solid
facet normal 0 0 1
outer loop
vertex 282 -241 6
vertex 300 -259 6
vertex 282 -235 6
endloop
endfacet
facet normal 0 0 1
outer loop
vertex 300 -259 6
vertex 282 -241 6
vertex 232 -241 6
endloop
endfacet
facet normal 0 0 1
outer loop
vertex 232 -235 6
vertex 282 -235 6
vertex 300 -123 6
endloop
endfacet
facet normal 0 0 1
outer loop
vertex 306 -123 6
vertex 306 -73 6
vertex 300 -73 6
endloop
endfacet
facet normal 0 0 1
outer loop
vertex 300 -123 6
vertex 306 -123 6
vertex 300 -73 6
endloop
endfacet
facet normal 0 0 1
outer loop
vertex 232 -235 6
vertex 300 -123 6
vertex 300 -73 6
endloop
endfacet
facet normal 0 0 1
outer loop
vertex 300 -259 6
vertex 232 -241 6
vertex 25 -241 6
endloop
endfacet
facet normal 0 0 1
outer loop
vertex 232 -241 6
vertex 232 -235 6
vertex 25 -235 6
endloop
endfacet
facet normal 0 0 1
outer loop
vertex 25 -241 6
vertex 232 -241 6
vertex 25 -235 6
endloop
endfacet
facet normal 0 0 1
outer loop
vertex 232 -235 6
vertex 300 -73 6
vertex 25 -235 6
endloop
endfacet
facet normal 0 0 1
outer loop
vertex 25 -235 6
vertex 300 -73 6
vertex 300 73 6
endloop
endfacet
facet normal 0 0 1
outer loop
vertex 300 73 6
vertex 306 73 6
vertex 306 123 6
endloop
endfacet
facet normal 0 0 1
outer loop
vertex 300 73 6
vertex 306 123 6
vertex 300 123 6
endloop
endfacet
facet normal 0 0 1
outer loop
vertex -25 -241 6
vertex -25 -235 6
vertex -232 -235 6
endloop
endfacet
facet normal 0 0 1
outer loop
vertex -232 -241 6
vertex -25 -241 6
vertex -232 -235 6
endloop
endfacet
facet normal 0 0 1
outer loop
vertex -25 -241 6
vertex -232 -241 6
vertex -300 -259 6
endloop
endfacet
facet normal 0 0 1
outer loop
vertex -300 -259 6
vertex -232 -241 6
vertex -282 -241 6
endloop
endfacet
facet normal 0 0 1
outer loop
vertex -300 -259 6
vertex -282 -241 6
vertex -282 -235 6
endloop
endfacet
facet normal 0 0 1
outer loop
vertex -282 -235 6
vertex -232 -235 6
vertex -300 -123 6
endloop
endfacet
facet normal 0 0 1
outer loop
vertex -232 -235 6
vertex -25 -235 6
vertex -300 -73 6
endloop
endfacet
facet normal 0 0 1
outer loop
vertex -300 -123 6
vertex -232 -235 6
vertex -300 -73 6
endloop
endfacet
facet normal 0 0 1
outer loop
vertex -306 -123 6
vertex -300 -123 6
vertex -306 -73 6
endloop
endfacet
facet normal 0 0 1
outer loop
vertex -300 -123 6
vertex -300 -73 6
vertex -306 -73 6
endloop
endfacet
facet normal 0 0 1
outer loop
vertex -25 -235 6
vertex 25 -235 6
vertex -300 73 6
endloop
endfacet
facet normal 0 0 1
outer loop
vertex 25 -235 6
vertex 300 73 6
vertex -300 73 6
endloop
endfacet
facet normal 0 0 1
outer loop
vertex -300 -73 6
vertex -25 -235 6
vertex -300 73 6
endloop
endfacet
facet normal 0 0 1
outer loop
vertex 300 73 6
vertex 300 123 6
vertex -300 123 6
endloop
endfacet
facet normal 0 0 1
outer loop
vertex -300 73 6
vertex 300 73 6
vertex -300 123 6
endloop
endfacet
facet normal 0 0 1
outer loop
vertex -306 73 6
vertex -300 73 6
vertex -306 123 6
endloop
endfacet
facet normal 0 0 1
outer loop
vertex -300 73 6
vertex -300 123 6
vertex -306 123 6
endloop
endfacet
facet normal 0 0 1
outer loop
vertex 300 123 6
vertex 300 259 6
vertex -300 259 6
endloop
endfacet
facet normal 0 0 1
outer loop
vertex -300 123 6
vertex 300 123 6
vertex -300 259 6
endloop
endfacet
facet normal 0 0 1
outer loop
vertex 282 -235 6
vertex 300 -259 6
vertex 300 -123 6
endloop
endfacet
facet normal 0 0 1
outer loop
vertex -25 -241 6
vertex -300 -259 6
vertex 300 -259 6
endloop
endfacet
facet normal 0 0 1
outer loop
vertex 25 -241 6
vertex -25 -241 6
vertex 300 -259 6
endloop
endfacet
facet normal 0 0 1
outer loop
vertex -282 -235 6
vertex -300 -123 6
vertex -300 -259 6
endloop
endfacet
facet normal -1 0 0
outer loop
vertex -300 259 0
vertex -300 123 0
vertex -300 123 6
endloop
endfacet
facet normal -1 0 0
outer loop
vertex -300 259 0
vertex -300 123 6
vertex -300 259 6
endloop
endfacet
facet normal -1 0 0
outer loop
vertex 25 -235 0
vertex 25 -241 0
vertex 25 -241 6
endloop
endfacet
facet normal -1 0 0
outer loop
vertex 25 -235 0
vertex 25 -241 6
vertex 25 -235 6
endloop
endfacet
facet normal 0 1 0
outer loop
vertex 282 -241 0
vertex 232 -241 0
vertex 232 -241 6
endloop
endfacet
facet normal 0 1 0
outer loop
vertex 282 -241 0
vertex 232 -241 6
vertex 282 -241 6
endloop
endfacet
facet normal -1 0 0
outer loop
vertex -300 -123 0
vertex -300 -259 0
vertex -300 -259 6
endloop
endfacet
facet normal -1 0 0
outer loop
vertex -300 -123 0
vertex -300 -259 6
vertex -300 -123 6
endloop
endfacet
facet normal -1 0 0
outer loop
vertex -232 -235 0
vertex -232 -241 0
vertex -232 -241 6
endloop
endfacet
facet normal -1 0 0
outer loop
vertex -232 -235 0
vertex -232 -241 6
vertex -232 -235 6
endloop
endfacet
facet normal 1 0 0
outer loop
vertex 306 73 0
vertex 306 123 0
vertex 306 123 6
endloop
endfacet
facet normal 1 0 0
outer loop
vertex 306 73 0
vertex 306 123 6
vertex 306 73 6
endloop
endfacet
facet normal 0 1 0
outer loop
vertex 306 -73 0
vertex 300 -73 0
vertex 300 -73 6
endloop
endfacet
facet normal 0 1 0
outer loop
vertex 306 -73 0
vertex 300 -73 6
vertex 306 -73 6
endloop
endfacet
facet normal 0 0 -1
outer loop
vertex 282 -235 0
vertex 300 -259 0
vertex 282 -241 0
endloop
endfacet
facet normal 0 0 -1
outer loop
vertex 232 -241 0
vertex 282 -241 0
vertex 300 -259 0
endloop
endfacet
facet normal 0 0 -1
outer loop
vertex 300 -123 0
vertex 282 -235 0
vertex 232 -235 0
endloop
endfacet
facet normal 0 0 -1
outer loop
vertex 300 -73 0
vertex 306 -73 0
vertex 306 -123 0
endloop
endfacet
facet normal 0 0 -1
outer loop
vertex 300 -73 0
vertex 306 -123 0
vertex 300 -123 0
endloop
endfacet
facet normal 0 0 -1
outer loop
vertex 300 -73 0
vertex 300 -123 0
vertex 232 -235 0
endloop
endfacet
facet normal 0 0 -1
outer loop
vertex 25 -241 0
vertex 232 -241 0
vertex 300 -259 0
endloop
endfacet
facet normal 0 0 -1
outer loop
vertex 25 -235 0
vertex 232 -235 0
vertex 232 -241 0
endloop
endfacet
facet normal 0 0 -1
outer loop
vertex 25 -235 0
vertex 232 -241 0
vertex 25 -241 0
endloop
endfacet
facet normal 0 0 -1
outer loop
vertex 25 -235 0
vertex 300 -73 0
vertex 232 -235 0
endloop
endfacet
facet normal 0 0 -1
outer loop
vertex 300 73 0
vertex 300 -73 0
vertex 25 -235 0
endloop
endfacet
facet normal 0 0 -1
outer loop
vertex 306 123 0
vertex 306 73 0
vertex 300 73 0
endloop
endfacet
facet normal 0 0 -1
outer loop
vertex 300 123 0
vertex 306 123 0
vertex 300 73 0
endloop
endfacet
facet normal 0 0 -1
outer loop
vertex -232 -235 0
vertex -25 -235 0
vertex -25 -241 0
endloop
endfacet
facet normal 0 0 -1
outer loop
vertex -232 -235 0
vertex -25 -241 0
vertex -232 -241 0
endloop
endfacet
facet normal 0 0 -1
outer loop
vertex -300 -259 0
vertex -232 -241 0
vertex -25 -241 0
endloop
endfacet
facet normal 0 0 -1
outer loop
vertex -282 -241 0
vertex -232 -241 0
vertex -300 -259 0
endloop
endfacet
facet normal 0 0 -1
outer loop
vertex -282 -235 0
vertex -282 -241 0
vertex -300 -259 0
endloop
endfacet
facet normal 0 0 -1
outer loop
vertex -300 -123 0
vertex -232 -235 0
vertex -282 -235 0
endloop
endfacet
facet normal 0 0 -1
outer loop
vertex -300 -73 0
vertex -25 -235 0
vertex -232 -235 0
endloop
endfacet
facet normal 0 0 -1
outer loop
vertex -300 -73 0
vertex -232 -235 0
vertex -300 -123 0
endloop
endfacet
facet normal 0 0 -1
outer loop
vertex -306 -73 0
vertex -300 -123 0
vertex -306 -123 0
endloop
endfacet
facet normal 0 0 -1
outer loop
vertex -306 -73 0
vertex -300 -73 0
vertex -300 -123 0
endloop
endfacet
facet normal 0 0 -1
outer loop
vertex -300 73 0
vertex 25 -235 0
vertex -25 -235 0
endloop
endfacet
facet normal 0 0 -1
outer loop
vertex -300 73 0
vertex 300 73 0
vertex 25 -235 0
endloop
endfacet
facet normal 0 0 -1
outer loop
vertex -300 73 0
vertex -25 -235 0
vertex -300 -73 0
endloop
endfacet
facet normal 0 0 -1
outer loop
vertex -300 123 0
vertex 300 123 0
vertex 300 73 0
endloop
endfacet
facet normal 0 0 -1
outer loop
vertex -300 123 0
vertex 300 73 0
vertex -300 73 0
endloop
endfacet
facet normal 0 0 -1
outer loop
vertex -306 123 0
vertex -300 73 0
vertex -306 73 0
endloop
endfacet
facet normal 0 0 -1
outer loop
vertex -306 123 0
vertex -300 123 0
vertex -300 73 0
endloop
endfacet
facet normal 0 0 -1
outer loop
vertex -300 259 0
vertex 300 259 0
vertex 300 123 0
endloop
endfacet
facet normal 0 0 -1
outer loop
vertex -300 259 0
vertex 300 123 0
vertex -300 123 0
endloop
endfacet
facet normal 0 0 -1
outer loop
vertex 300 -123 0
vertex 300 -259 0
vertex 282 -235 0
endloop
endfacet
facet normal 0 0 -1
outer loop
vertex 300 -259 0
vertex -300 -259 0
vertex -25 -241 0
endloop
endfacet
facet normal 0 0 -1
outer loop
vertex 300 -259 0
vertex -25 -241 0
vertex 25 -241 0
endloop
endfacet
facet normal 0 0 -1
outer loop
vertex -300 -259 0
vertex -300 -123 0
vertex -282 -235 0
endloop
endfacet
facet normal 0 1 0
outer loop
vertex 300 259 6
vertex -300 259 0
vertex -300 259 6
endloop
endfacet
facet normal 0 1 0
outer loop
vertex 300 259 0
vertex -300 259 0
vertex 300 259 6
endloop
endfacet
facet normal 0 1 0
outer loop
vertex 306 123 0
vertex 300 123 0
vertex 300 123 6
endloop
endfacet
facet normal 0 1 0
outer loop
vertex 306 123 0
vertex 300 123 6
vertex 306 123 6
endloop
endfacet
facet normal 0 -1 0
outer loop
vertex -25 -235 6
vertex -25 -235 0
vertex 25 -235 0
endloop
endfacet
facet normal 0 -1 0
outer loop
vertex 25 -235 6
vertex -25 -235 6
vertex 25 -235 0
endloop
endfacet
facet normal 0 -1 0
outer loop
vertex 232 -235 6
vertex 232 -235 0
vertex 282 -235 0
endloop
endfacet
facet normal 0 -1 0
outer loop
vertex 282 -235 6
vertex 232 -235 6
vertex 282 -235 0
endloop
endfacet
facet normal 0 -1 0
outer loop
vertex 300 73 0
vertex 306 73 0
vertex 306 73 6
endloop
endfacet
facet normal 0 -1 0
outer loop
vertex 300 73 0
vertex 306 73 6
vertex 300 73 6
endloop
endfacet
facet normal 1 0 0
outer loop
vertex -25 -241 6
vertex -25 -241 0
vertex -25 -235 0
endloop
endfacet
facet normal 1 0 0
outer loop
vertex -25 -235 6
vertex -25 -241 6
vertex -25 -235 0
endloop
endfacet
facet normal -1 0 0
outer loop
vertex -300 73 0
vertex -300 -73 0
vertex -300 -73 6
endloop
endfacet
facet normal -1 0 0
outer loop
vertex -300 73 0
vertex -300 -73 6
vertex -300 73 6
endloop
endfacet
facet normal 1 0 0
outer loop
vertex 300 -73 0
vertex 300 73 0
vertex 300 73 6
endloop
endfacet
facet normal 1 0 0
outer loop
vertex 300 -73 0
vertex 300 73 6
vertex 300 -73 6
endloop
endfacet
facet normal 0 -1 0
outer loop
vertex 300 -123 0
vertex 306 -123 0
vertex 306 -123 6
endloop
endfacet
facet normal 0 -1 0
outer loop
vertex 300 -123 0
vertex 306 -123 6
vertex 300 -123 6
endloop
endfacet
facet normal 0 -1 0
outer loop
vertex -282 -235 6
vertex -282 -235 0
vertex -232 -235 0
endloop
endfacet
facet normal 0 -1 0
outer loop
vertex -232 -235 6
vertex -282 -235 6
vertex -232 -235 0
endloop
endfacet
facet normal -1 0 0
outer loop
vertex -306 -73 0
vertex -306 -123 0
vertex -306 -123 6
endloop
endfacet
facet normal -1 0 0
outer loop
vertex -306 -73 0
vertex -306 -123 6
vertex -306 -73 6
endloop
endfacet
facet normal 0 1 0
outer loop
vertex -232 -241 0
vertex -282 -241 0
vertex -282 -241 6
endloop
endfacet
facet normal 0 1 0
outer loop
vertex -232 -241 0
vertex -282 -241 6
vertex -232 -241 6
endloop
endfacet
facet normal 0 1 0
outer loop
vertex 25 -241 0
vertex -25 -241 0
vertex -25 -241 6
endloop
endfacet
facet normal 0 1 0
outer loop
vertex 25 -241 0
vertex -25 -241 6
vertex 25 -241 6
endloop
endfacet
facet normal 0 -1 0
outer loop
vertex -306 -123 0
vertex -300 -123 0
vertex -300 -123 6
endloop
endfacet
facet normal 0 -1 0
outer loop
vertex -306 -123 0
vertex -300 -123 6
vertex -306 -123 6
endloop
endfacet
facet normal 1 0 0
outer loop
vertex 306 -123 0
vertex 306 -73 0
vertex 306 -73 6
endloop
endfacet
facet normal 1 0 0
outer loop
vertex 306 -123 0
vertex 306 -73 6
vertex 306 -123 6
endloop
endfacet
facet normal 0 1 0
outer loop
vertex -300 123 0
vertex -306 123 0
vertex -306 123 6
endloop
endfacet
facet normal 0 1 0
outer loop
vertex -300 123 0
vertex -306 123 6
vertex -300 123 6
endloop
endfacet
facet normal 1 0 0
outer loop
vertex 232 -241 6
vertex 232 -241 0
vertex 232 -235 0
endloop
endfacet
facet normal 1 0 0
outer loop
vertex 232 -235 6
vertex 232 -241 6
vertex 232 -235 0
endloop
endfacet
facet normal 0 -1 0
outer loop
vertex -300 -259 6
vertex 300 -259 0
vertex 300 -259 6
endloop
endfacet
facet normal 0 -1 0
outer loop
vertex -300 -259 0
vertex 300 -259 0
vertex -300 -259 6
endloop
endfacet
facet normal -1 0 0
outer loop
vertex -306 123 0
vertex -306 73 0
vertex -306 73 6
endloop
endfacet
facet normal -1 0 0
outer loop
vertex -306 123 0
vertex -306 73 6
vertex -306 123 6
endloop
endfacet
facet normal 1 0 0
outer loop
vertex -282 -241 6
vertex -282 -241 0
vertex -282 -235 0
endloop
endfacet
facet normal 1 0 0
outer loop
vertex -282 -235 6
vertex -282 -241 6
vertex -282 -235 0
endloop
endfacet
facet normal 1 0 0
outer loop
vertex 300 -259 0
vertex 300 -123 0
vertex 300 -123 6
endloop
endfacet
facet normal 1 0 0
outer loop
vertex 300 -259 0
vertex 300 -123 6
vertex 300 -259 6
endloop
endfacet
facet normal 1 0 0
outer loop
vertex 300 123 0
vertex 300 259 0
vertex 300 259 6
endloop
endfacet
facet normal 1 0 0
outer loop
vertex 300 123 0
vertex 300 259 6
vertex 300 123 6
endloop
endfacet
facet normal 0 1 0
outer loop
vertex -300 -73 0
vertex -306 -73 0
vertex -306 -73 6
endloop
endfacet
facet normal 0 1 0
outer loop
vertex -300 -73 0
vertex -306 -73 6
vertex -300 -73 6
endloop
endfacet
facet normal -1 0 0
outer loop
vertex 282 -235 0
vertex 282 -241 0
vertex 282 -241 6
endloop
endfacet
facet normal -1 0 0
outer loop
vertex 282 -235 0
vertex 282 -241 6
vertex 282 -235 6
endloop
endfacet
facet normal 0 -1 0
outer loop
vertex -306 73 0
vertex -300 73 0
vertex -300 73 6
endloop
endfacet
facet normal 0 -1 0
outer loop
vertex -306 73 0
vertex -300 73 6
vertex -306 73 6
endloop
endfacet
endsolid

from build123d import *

# Parameters (mm, degrees)
SKETCH1_W           = 50
SKETCH1_H           = 6
BOSS_EXTRUDE1_DEPTH = 6


with BuildPart() as part:
    # Sketch1 → Boss-Extrude1 (new body)
    with BuildSketch(Plane.XY):
        Polygon((-300, 259), (300, 259), (300, 123), (306, 123), (306, 73), (300, 73), (300, -73), (306, -73), (306, -123), (300, -123), (300, -259), (-300, -259), (-300, -123), (-306, -123), (-306, -73), (-300, -73), (-300, 73), (-306, 73), (-306, 123), (-300, 123), align=None)
        with Locations((257, -238)):
            Rectangle(SKETCH1_W, SKETCH1_H, mode=Mode.SUBTRACT)
        with Locations((-257, -238)):
            Rectangle(SKETCH1_W, SKETCH1_H, mode=Mode.SUBTRACT)
        with Locations((0, -238)):
            Rectangle(SKETCH1_W, SKETCH1_H, mode=Mode.SUBTRACT)
    extrude(amount=BOSS_EXTRUDE1_DEPTH)


solid = part.part
